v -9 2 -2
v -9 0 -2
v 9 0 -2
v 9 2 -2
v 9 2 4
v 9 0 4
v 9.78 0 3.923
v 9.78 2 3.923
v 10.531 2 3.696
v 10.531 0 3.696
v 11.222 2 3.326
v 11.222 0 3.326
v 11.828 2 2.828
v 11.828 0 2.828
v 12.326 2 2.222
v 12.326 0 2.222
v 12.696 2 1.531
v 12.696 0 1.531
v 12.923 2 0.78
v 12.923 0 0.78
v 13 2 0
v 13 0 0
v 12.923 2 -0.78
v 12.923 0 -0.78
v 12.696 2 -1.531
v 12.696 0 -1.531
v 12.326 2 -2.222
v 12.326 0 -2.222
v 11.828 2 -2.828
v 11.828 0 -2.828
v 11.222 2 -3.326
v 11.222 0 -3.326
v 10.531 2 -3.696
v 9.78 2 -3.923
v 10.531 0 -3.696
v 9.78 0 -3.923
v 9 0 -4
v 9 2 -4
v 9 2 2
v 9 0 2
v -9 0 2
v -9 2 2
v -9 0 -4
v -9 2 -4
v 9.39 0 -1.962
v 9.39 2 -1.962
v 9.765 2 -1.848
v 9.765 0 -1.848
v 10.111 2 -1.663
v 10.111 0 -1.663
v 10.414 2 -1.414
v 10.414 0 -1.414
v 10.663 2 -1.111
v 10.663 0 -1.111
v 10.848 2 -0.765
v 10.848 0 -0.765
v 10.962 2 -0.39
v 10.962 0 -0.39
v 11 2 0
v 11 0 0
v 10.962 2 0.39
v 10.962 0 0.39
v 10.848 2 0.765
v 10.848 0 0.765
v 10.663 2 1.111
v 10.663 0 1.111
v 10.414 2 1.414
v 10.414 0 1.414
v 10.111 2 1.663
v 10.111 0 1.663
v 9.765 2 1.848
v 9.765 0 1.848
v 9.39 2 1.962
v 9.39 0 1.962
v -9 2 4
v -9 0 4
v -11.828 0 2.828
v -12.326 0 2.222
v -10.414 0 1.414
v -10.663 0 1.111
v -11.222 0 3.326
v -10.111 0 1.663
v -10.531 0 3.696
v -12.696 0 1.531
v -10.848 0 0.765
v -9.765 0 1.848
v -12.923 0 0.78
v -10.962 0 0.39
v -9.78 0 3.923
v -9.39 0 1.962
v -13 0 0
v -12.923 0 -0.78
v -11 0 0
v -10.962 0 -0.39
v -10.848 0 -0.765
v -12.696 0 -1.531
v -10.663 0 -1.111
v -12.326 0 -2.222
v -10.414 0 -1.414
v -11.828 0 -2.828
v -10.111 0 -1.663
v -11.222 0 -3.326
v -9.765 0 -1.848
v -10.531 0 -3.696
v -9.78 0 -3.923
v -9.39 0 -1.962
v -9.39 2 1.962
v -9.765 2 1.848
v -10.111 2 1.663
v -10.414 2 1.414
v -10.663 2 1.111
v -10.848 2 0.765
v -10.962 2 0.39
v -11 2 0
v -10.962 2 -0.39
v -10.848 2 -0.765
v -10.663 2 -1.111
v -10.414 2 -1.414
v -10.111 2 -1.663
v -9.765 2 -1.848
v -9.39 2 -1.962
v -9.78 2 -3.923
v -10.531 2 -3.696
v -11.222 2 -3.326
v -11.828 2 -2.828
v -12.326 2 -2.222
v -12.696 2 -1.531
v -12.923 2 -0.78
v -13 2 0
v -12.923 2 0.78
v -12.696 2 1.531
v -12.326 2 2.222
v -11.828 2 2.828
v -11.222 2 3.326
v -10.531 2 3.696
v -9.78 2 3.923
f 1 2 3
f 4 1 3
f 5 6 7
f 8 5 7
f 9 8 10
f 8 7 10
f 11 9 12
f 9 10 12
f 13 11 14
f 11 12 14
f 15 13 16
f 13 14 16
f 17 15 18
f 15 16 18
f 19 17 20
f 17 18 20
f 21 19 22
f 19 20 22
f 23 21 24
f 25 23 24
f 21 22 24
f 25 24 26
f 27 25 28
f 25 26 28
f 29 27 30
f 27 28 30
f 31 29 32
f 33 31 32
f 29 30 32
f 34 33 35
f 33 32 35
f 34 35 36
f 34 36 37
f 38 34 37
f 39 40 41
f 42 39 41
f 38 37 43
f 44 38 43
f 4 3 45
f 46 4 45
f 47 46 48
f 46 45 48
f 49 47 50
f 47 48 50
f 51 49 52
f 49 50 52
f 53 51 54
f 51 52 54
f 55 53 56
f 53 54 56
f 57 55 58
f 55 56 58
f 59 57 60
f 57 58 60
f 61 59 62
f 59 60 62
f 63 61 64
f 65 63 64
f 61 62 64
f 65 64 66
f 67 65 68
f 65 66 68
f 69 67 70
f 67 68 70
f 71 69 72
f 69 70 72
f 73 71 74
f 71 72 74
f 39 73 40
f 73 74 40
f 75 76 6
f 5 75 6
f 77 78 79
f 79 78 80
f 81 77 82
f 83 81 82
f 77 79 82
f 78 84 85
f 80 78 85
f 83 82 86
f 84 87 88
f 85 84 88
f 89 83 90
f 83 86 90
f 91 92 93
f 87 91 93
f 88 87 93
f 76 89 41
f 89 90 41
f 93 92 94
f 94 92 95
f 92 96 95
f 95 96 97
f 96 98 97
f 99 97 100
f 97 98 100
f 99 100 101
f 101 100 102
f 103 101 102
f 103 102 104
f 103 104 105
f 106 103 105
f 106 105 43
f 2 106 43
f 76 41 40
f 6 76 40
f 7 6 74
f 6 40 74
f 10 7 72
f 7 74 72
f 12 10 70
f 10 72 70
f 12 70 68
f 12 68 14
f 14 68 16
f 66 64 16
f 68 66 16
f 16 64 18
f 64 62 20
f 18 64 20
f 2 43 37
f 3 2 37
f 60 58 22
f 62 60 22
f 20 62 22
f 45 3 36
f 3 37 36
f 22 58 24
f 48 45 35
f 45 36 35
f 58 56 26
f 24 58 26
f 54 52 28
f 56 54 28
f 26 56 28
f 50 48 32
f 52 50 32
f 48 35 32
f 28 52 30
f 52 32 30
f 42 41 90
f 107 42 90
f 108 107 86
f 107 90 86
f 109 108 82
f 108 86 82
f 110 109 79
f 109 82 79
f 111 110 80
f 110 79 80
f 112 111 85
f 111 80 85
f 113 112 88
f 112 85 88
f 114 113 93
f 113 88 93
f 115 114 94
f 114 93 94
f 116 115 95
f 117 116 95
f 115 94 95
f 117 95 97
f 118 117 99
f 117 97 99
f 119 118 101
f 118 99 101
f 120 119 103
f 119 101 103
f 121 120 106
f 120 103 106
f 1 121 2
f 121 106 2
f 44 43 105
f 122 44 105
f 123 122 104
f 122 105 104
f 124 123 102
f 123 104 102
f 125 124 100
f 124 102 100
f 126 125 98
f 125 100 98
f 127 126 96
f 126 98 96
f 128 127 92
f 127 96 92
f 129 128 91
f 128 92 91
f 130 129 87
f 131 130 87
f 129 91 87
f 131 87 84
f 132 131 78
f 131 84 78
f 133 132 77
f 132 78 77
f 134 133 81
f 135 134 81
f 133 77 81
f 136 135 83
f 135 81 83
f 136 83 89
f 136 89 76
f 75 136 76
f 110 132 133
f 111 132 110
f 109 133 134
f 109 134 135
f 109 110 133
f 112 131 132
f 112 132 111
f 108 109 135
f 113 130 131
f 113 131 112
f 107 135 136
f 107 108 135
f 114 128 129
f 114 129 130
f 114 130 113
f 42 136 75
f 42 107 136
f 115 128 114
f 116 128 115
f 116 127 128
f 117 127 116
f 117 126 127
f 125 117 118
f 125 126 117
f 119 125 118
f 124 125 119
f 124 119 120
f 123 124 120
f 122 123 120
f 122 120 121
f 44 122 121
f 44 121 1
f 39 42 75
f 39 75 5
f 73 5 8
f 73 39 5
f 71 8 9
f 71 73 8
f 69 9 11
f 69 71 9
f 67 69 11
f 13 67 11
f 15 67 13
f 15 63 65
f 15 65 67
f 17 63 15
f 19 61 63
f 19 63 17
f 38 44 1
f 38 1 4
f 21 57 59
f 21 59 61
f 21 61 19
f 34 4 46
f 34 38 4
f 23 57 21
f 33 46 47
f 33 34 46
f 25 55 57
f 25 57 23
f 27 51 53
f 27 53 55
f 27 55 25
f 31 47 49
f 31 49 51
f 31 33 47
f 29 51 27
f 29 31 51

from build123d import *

# Parameters (mm, degrees)
BOSS_EXTRUDE1_DEPTH = 2


with BuildPart() as part:
    # Sketch1 → Boss-Extrude1 (new body)
    with BuildSketch(Plane(origin=(0, 0, 0), x_dir=(1, 0, 0), z_dir=(0, 1, 0))):
        with BuildLine():
            ThreePointArc((9, -4), (13, 0), (9, 4))
            Line((9, 4), (-9, 4))
            ThreePointArc((-9, 4), (-13, 0), (-9, -4))
            Line((-9, -4), (9, -4))
        make_face()
        with BuildLine():
            Line((-9, 2), (9, 2))
            ThreePointArc((9, 2), (11, 0), (9, -2))
            Line((9, -2), (-9, -2))
            ThreePointArc((-9, -2), (-11, 0), (-9, 2))
        make_face(mode=Mode.SUBTRACT)
    extrude(amount=BOSS_EXTRUDE1_DEPTH)


solid = part.part
